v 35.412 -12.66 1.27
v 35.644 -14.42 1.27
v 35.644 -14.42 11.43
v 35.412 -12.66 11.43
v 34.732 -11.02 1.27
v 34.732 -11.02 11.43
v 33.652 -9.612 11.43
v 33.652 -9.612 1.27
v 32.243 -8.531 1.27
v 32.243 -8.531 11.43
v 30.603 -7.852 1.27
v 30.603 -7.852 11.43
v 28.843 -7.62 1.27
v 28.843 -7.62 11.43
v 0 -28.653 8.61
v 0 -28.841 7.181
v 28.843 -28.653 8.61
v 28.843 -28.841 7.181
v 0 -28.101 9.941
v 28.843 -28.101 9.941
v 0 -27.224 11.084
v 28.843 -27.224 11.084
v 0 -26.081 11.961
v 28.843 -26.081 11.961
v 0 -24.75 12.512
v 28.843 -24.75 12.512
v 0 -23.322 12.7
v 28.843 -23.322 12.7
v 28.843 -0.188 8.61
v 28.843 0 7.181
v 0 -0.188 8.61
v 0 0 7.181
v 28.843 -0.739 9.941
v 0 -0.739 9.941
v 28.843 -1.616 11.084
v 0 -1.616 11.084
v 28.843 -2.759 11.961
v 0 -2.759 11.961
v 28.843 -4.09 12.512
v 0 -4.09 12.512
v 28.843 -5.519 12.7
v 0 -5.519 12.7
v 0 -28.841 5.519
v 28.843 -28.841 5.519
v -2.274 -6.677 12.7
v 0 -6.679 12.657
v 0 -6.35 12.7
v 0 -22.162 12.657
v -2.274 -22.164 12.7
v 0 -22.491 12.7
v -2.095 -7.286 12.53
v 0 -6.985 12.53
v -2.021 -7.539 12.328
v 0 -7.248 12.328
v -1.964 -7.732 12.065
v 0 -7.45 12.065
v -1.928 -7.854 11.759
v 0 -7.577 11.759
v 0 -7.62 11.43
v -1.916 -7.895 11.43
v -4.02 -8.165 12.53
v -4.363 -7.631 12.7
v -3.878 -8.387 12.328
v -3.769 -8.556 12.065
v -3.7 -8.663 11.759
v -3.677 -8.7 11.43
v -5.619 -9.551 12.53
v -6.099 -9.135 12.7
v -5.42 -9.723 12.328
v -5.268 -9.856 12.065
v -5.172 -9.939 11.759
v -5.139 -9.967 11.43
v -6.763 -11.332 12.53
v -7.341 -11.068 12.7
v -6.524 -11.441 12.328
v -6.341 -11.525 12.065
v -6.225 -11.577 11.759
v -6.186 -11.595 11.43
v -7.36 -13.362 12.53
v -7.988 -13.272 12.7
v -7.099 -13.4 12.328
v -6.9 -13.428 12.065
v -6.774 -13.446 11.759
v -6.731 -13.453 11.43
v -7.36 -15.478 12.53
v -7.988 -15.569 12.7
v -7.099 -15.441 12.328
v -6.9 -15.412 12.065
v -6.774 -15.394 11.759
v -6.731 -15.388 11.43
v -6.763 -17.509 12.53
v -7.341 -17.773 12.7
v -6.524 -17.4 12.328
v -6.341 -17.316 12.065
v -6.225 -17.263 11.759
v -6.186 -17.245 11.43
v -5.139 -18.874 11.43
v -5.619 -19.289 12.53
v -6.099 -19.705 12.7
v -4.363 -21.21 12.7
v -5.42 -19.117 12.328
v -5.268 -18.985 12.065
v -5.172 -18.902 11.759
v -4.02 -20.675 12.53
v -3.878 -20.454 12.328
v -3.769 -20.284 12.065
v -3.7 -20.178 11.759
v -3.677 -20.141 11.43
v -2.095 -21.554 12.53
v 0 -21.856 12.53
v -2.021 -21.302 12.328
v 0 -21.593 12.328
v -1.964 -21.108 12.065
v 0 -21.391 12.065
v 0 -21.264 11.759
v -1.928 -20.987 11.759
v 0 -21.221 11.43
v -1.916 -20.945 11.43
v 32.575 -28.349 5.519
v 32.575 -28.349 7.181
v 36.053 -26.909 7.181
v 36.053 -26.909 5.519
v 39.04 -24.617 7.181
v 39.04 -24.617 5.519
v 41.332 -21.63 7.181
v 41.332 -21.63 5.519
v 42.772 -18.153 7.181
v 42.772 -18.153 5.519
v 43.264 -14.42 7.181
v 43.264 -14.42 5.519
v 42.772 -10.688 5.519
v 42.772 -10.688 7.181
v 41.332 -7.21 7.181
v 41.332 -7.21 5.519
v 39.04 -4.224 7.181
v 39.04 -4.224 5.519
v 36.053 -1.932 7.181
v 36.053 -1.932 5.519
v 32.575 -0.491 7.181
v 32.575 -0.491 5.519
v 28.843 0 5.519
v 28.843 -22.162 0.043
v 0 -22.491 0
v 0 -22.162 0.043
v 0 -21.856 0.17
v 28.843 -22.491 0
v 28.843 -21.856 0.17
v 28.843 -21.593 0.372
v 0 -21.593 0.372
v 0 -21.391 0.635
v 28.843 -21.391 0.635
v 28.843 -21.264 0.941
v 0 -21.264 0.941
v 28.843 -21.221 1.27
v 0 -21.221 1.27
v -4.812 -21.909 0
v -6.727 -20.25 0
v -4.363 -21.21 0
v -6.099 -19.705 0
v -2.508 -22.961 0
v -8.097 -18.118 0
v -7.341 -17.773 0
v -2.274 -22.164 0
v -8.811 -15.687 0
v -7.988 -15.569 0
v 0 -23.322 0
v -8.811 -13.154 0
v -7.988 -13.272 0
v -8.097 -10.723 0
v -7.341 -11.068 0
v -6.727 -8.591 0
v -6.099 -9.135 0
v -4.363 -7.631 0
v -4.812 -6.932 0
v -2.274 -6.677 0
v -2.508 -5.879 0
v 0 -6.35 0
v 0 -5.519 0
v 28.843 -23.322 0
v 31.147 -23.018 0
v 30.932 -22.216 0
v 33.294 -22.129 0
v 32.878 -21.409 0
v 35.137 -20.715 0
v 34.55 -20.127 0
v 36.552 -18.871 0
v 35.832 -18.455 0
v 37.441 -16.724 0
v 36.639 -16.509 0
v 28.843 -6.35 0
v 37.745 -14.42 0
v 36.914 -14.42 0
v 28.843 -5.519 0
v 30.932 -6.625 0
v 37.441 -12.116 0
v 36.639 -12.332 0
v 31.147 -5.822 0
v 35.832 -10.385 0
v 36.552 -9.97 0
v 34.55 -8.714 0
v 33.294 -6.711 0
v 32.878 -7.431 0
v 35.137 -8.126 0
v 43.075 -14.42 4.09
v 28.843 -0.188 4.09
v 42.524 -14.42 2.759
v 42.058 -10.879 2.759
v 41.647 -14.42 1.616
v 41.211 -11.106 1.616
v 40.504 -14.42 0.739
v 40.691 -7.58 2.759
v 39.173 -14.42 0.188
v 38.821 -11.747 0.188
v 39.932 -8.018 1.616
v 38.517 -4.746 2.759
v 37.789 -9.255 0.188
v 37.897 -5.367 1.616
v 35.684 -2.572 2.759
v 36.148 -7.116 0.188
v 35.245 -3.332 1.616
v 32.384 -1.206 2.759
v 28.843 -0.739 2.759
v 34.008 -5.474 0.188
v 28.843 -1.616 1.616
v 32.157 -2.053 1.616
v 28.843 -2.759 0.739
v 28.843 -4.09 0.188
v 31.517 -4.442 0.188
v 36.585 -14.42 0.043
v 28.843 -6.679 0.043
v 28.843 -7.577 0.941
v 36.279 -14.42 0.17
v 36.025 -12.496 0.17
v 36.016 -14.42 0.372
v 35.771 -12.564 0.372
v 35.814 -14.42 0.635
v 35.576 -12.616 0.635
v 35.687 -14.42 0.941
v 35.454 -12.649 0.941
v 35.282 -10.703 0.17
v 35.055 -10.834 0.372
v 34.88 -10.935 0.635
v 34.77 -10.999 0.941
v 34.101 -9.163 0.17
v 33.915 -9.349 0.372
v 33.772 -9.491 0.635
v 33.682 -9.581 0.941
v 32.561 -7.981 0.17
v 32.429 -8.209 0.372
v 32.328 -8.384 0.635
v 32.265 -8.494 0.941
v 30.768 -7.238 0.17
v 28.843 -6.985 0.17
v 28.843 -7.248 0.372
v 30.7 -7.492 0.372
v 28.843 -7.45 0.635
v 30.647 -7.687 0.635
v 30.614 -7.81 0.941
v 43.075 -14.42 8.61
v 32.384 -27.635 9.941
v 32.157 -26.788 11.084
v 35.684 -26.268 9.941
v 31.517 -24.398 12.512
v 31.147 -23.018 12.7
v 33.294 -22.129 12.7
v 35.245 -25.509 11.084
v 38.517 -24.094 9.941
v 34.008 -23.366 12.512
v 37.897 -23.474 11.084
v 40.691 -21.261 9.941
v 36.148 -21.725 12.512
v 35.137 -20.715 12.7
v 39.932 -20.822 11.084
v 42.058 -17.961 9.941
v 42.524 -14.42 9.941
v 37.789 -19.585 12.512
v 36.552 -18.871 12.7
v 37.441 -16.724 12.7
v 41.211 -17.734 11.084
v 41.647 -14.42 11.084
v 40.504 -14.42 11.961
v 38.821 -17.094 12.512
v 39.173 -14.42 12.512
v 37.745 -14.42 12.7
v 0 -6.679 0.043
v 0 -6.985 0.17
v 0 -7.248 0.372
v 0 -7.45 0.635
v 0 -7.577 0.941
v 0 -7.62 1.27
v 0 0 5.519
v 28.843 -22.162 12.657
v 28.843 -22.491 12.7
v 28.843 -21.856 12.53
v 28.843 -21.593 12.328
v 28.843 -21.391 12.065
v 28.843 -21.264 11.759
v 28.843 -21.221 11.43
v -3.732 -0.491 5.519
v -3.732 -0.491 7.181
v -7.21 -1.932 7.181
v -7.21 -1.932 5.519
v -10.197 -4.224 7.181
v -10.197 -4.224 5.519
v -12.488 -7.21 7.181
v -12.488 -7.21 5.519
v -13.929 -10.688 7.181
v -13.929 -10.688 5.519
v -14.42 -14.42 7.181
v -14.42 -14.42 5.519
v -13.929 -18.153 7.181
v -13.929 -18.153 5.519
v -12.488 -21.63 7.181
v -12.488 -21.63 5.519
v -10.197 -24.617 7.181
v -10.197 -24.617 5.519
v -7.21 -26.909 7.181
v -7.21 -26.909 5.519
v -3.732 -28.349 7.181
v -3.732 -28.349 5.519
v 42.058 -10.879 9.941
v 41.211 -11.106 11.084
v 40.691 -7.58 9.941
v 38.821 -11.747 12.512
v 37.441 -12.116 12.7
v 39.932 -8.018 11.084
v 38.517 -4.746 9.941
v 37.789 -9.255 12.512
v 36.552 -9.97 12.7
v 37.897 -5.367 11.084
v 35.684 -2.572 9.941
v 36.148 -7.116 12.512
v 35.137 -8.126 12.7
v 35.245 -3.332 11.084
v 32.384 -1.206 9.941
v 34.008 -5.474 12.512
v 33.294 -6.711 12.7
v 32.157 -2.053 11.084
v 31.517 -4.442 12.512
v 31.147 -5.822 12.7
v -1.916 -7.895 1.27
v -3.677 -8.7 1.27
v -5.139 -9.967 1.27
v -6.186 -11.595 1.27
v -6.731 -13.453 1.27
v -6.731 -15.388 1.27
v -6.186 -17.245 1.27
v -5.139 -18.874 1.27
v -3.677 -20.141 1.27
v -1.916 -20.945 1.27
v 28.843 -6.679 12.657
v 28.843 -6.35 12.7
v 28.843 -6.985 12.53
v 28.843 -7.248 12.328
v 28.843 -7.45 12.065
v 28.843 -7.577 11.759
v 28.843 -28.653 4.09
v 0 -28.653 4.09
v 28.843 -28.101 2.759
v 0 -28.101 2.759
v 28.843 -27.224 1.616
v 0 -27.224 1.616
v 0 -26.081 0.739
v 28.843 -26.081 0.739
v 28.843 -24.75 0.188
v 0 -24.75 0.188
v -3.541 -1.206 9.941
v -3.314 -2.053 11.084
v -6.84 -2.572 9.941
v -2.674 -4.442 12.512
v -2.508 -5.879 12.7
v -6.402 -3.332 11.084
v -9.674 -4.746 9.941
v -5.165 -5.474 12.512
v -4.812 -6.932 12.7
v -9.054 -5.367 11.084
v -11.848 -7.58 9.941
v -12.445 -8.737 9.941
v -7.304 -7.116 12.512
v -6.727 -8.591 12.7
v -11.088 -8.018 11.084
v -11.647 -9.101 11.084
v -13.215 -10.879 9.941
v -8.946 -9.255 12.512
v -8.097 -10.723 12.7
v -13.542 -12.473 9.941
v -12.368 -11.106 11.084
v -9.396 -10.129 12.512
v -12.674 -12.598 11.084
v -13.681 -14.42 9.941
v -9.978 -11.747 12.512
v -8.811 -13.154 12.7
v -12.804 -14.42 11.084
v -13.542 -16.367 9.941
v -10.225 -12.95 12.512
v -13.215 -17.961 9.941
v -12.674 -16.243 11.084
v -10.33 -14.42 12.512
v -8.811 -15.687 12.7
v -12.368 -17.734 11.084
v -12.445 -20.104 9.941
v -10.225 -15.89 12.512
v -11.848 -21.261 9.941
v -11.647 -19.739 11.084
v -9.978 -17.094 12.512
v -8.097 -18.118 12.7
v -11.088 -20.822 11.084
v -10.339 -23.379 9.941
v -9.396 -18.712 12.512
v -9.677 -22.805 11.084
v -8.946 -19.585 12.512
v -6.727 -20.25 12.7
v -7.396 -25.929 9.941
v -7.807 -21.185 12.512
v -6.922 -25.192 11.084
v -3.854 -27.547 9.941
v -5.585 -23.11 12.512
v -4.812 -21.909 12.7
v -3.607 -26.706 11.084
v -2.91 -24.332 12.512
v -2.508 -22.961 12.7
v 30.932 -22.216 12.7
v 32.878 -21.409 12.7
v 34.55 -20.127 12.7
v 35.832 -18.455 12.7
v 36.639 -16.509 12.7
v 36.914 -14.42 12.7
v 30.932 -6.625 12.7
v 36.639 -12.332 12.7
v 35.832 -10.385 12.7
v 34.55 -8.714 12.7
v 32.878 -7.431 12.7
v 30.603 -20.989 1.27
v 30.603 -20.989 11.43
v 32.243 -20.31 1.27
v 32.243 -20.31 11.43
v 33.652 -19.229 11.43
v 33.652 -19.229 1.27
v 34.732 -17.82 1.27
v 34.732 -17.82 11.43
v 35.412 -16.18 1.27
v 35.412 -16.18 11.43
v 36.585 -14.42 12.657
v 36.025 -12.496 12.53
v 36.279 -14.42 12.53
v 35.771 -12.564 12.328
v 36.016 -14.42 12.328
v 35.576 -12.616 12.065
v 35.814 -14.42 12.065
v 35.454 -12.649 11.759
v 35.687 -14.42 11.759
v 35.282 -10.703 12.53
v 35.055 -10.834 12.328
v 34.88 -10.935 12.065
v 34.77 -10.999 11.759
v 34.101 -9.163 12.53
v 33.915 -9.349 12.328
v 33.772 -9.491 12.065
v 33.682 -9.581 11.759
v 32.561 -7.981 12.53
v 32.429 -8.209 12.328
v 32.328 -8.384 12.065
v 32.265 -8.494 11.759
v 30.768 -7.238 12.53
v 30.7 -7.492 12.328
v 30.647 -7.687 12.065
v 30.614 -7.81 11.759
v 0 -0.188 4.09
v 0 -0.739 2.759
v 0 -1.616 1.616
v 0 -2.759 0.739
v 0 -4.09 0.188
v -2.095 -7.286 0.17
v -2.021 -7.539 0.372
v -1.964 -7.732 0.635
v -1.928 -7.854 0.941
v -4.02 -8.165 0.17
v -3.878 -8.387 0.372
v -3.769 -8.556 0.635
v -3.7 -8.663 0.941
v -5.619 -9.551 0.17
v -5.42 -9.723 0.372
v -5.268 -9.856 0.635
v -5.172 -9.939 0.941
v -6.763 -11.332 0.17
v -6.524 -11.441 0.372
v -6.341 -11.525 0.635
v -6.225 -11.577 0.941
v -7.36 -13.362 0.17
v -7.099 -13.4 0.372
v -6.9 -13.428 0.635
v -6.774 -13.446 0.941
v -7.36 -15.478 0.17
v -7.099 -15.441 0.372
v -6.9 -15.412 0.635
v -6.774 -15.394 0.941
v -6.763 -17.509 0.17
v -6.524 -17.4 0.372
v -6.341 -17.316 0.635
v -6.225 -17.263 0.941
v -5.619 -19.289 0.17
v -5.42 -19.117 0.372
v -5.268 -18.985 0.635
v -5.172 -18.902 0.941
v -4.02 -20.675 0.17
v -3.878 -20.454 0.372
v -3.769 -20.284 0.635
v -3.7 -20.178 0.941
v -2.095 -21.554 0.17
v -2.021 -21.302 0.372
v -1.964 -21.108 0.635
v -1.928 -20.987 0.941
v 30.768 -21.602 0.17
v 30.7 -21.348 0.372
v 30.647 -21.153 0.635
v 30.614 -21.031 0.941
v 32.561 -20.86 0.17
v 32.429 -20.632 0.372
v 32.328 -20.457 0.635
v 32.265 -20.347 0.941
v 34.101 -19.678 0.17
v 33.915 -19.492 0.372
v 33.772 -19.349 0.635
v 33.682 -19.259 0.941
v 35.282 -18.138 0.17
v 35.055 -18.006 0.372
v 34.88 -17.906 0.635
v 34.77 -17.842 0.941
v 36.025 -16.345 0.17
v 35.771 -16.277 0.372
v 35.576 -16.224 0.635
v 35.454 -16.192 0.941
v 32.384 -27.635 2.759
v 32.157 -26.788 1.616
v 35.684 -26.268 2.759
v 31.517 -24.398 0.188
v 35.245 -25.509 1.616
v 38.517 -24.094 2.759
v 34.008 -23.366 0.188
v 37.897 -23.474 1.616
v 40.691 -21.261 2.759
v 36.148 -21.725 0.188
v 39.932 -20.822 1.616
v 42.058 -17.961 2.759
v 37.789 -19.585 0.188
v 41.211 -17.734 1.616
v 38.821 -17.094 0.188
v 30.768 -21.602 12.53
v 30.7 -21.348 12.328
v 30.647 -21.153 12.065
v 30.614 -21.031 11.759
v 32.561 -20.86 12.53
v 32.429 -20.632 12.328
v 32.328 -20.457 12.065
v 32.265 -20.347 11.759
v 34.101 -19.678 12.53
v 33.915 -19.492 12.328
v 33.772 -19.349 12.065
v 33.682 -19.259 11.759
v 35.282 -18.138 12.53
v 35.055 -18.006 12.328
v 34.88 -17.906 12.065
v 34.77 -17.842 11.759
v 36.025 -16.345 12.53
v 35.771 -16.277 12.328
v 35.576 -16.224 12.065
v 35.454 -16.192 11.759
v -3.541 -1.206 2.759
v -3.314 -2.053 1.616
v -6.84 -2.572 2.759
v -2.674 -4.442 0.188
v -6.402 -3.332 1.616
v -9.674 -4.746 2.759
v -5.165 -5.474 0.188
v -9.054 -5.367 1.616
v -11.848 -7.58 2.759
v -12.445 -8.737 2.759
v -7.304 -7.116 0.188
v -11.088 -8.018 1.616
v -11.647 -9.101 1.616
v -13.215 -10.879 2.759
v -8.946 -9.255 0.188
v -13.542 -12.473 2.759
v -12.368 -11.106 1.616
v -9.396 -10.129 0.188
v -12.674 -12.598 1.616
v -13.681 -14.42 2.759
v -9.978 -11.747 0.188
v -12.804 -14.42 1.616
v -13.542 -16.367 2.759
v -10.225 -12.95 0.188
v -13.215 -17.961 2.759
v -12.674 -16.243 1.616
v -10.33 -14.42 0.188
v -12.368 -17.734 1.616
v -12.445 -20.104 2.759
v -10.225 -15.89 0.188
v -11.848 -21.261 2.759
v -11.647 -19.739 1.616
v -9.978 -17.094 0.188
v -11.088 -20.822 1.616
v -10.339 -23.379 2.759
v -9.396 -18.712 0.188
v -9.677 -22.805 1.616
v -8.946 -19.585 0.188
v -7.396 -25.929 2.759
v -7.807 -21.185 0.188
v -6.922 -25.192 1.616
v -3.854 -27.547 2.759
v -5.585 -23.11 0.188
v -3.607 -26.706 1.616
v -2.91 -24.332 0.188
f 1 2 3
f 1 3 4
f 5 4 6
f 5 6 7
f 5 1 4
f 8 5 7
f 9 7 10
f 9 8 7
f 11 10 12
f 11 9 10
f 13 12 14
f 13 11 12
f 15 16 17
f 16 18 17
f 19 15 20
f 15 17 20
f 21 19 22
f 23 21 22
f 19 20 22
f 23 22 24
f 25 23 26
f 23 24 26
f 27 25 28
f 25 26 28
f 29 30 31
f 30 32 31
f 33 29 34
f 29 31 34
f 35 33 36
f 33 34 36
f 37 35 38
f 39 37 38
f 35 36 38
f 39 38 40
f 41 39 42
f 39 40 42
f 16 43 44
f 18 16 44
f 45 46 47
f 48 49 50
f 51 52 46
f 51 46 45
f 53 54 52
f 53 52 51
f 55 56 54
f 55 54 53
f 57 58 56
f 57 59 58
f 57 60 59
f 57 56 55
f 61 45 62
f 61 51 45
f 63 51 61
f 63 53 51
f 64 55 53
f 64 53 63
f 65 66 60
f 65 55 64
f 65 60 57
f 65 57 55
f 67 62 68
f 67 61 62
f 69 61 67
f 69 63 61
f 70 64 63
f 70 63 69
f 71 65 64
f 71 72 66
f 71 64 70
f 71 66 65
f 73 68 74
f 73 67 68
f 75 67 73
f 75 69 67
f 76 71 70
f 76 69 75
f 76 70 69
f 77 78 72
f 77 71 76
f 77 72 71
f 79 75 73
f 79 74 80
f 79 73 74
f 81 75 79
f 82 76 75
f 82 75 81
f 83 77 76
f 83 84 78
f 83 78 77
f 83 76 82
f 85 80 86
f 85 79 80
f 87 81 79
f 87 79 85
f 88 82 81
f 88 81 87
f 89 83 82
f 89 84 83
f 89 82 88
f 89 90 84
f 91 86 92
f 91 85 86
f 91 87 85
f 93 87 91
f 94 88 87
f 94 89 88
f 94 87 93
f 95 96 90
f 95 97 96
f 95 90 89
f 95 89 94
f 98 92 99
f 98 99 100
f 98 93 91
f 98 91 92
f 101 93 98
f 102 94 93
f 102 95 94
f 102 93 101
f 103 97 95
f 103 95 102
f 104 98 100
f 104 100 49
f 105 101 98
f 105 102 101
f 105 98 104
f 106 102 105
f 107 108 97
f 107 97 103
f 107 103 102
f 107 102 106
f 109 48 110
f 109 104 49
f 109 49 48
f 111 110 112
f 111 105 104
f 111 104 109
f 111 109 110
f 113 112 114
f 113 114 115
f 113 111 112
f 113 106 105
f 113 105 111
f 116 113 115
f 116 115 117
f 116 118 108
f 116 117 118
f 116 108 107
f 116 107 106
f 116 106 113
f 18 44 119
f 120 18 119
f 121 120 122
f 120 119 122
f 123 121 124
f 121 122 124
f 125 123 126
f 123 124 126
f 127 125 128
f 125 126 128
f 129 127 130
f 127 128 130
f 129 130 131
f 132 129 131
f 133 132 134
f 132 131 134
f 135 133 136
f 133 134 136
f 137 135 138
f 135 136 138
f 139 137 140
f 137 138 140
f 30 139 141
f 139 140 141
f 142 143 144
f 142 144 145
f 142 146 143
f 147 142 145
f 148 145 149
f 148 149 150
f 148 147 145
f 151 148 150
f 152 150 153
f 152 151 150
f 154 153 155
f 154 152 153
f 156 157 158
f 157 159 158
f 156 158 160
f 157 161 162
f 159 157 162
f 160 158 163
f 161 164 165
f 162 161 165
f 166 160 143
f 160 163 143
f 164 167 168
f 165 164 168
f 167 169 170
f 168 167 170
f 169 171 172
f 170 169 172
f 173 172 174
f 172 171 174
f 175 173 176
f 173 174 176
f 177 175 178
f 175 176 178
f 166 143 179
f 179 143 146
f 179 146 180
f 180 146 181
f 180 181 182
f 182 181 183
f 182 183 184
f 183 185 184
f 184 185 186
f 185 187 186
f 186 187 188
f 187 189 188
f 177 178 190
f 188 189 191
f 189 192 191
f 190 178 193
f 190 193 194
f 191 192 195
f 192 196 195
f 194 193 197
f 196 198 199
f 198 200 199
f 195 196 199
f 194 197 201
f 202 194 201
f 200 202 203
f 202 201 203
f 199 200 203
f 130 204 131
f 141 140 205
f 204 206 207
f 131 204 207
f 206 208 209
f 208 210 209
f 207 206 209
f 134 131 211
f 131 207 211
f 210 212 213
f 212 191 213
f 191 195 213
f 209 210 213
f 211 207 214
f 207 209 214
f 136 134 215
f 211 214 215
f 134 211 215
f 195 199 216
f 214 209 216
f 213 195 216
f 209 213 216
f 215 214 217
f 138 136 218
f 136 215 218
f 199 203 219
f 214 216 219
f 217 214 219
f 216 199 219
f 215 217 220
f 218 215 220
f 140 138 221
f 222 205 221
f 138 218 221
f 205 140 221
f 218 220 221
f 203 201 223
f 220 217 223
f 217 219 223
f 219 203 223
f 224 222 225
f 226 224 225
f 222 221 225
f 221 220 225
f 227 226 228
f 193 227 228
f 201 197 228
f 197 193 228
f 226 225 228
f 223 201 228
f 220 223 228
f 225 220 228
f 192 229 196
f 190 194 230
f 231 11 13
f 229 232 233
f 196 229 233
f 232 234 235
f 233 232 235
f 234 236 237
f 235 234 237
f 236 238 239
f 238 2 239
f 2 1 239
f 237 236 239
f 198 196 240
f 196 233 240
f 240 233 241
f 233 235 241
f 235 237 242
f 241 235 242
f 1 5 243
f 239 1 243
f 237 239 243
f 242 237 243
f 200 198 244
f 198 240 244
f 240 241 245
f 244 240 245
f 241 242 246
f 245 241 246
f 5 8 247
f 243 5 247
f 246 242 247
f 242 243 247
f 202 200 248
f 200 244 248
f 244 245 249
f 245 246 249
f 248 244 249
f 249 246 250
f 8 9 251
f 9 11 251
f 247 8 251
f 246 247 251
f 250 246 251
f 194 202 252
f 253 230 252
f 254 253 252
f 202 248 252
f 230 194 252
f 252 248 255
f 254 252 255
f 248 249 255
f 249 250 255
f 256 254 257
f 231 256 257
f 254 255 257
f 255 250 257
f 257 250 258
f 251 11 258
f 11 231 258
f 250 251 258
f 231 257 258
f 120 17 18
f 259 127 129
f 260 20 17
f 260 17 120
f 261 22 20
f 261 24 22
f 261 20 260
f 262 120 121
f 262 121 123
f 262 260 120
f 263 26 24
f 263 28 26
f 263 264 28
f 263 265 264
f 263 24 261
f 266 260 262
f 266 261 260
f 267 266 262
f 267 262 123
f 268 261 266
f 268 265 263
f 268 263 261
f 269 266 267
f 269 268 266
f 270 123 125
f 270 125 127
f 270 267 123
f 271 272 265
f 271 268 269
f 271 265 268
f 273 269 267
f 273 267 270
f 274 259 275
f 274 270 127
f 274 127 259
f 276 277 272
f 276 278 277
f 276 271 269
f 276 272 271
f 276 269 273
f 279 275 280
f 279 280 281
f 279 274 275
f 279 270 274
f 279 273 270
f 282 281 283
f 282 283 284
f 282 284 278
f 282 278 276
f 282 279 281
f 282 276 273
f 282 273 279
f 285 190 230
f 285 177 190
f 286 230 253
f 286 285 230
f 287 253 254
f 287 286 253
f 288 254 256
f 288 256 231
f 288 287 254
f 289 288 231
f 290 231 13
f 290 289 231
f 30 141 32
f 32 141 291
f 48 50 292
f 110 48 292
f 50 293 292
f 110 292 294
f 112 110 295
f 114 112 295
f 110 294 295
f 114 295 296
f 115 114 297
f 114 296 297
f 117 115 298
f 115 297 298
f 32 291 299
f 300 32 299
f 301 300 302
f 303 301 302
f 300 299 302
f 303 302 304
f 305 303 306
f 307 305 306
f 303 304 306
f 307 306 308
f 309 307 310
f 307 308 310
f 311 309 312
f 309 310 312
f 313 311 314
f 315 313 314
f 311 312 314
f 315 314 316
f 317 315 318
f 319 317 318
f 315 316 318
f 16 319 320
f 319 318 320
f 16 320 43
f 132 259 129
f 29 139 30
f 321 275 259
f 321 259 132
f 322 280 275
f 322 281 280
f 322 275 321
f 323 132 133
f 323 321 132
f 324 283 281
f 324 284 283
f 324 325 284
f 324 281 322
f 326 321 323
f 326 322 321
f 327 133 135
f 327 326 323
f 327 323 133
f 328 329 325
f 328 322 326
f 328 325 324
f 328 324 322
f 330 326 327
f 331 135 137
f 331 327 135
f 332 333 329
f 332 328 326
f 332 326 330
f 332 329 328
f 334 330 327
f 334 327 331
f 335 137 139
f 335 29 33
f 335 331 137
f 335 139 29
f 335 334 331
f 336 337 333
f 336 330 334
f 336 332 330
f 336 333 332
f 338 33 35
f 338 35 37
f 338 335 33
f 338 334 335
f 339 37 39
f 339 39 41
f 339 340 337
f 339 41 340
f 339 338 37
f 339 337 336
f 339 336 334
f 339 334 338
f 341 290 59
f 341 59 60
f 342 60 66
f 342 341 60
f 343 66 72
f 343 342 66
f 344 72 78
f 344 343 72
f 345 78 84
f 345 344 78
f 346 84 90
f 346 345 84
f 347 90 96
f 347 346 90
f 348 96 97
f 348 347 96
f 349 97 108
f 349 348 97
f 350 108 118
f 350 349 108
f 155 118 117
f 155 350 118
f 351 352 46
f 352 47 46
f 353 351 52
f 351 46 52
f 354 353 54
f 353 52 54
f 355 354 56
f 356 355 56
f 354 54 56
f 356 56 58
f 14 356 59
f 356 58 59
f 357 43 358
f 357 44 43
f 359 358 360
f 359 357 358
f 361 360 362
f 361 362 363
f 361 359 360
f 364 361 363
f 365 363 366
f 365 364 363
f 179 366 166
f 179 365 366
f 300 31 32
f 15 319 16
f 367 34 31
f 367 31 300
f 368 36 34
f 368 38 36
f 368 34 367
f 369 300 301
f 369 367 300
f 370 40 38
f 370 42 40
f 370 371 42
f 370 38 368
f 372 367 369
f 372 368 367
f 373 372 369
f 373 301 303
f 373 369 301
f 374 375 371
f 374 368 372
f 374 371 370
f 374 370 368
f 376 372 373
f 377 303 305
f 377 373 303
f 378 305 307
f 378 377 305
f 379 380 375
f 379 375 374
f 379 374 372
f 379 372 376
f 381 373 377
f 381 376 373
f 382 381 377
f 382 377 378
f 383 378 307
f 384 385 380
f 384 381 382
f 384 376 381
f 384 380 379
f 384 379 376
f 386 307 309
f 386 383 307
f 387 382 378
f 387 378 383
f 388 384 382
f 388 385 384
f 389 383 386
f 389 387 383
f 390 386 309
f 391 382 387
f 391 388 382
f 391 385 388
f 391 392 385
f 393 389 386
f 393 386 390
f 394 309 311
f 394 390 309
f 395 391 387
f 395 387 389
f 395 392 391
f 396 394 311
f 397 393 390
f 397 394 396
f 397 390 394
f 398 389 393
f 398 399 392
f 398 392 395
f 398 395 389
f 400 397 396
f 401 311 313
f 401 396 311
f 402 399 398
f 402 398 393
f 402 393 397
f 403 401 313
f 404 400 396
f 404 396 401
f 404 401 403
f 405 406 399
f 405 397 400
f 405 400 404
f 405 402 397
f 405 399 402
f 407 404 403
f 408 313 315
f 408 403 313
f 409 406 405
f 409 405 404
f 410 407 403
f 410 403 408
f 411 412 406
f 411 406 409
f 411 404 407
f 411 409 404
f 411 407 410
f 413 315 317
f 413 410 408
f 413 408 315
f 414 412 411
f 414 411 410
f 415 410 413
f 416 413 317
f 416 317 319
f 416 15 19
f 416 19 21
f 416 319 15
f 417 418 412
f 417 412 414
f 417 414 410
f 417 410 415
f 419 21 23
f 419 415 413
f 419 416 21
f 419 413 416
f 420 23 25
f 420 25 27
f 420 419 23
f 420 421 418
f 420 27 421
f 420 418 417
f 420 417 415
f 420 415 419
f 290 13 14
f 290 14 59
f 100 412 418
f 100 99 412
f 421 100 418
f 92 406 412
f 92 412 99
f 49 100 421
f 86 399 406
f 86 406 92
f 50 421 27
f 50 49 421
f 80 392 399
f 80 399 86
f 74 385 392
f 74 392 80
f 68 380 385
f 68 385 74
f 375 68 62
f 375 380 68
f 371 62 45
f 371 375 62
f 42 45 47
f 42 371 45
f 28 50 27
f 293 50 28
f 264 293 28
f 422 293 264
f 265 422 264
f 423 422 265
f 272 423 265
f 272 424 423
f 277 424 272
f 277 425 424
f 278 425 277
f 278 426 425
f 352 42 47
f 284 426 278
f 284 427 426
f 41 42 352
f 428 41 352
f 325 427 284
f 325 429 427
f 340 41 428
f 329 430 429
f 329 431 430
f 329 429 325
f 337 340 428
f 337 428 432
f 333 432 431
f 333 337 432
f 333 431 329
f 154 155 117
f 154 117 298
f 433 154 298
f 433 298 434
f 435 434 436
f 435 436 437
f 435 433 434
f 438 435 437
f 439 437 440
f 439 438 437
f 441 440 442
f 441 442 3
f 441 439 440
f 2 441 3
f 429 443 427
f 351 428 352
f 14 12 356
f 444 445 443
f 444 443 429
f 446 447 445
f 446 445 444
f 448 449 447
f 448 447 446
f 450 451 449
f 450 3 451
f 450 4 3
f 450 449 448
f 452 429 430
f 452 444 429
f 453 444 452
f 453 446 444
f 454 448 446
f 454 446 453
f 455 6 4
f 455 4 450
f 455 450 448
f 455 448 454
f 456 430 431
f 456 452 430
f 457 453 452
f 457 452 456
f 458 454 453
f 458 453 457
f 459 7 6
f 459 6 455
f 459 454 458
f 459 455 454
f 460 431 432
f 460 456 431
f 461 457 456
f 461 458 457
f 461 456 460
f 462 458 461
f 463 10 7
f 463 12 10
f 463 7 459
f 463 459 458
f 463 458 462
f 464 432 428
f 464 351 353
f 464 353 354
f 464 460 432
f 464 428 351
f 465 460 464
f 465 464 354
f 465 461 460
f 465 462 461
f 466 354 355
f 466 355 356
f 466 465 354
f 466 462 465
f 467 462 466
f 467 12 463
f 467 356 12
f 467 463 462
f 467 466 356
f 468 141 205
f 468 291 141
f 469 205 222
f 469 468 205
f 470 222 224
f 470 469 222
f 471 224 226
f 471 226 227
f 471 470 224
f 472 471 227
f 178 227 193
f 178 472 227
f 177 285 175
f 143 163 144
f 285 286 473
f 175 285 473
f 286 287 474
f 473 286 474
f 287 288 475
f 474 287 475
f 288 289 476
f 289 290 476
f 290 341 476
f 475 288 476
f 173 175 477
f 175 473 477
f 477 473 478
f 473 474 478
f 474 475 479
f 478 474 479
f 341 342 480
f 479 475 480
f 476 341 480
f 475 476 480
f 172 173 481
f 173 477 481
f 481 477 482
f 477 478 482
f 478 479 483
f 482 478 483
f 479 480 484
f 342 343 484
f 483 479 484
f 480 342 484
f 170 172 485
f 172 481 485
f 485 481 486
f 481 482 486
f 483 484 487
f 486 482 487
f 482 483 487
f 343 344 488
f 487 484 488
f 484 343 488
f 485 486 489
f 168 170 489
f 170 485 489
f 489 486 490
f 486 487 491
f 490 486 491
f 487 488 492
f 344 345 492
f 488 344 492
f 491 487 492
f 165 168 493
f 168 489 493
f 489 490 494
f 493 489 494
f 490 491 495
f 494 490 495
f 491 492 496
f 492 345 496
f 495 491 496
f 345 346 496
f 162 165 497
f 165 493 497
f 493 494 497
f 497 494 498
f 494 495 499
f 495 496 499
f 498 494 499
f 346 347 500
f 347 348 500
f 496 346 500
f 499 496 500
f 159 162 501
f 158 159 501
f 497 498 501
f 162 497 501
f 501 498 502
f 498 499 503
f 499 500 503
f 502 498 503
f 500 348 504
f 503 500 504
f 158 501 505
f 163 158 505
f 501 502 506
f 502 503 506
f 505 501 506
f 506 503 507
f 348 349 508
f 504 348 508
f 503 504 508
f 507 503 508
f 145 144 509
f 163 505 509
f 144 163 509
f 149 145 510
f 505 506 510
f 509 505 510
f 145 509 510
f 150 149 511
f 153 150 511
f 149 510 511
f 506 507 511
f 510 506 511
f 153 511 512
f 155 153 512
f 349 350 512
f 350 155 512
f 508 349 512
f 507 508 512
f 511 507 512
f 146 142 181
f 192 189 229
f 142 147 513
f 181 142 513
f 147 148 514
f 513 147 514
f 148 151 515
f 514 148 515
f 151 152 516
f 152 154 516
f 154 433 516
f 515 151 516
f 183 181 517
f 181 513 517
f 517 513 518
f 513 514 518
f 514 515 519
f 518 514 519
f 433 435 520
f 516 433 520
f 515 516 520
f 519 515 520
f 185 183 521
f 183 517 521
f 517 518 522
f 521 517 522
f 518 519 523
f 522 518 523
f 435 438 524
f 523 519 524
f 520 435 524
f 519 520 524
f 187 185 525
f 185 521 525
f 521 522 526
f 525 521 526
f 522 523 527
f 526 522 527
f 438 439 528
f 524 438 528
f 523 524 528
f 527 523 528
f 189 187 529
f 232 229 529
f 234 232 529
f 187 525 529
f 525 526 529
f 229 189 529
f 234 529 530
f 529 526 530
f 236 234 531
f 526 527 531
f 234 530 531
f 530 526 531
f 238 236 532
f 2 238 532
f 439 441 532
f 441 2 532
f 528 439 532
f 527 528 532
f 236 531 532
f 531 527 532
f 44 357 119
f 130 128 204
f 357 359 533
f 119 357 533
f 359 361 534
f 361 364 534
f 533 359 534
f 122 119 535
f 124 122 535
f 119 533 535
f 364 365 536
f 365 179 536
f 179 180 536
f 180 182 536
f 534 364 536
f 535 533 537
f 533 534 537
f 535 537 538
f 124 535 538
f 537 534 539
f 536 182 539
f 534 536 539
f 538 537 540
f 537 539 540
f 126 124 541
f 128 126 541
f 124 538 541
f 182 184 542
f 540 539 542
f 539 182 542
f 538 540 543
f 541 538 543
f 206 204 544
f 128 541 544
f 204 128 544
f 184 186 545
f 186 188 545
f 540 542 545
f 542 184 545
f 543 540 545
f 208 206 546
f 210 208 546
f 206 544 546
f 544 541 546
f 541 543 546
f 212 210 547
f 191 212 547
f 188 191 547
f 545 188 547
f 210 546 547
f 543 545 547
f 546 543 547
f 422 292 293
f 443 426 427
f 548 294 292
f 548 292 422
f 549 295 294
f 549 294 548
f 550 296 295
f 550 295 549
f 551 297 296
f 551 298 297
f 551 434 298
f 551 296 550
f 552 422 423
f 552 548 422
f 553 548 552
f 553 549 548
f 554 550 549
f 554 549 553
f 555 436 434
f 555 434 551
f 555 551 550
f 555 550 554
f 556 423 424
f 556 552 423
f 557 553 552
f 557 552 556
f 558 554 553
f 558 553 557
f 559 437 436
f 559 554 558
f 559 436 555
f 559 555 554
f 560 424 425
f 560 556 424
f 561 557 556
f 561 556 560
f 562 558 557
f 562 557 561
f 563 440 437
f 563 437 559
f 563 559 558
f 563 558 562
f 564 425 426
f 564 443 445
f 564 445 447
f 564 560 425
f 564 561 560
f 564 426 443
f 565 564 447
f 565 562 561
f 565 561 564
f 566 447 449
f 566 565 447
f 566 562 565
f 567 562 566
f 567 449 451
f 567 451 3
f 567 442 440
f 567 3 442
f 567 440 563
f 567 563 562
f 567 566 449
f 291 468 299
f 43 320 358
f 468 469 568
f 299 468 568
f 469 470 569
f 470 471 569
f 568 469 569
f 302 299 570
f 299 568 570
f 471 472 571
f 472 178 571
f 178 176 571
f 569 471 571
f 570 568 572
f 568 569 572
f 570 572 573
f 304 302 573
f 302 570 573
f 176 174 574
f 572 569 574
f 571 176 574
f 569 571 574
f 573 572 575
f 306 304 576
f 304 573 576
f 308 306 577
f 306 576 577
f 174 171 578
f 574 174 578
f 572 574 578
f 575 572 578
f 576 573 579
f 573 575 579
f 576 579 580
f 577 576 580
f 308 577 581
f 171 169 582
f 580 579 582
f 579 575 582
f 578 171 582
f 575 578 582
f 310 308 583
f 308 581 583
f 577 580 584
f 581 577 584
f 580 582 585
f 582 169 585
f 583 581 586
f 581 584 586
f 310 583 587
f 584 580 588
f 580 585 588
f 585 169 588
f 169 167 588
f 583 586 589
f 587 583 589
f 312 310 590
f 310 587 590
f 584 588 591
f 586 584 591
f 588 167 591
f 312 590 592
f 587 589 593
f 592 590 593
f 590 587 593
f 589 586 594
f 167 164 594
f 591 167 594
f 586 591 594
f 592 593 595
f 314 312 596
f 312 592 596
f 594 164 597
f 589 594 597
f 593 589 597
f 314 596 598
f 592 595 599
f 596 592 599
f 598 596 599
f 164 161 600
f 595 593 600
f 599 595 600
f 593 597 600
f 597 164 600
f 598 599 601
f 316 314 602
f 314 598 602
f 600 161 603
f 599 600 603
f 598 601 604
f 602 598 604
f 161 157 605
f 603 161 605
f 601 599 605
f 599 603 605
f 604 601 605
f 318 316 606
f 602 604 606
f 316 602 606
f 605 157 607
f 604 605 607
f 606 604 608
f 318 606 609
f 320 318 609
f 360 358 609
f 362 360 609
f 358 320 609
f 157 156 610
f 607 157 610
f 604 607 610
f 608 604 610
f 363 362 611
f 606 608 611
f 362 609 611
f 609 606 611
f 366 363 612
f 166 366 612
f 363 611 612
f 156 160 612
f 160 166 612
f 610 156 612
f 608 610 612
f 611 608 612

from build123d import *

# Parameters (mm, degrees)
F1_DEPTH = 12.7
F2_T     = -7.62
F3_R     = 5.5188922036
F4_R     = 1.27


with BuildPart() as f1:
    # F0 (on Top) → F1 (new body)
    with BuildSketch(Plane.XY):
        with BuildLine():
            Line((0, -28.8406666368), (0, 0))
            ThreePointArc((0, 0), (-14.4203333184, -14.4203333184), (0, -28.8406666368))
        make_face()
        with BuildLine():
            ThreePointArc((43.2635399552, -14.4203333184), (39.0399221132, -4.223617842), (28.8432066368, 0))
            Line((28.8432066368, 0), (28.8432066368, -28.8406666368))
            ThreePointArc((28.8432066368, -28.8406666368), (39.0399221132, -24.6170487948), (43.2635399552, -14.4203333184))
        make_face()
        with BuildLine():
            Line((28.8432066368, 0), (0, 0))
            ThreePointArc((0, 0), (10.1967154764, -4.223617842), (14.4203333184, -14.4203333184))
            ThreePointArc((14.4203333184, -14.4203333184), (10.1967154764, -24.6170487948), (0, -28.8406666368))
            Line((0, -28.8406666368), (28.8432066368, -28.8406666368))
            ThreePointArc((28.8432066368, -28.8406666368), (14.4228733184, -14.4203333184), (28.8432066368, 0))
        make_face()
        with BuildLine():
            ThreePointArc((14.4203333184, -14.4203333184), (10.1967154764, -4.223617842), (0, 0))
            Line((0, 0), (0, -28.8406666368))
            ThreePointArc((0, -28.8406666368), (10.1967154764, -24.6170487948), (14.4203333184, -14.4203333184))
        make_face()
        with BuildLine():
            Line((28.8432066368, -28.8406666368), (28.8432066368, 0))
            ThreePointArc((28.8432066368, 0), (14.4228733184, -14.4203333184), (28.8432066368, -28.8406666368))
        make_face()
    extrude(amount=F1_DEPTH)

    # F2
    f2_openings = [f1.faces().sort_by_distance(p)[0] for p in [
        (14.421603, -14.420333, 12.7),
        (14.421603, -14.420333, 0),
    ]]
    offset(amount=F2_T, openings=f2_openings)

    # F3
    f3_edges = [f1.edges().sort_by_distance(p)[0] for p in [
        (14.421603, -28.840667, 12.7),
        (14.421603, -28.840667, 0),
    ]]
    fillet(f3_edges, radius=F3_R)

    # F4
    f4_edges = [f1.edges().sort_by_distance(p)[0] for p in [
        (14.421603, -7.62, 0),
        (14.421603, -7.62, 12.7),
    ]]
    fillet(f4_edges, radius=F4_R)


solid = f1.part
